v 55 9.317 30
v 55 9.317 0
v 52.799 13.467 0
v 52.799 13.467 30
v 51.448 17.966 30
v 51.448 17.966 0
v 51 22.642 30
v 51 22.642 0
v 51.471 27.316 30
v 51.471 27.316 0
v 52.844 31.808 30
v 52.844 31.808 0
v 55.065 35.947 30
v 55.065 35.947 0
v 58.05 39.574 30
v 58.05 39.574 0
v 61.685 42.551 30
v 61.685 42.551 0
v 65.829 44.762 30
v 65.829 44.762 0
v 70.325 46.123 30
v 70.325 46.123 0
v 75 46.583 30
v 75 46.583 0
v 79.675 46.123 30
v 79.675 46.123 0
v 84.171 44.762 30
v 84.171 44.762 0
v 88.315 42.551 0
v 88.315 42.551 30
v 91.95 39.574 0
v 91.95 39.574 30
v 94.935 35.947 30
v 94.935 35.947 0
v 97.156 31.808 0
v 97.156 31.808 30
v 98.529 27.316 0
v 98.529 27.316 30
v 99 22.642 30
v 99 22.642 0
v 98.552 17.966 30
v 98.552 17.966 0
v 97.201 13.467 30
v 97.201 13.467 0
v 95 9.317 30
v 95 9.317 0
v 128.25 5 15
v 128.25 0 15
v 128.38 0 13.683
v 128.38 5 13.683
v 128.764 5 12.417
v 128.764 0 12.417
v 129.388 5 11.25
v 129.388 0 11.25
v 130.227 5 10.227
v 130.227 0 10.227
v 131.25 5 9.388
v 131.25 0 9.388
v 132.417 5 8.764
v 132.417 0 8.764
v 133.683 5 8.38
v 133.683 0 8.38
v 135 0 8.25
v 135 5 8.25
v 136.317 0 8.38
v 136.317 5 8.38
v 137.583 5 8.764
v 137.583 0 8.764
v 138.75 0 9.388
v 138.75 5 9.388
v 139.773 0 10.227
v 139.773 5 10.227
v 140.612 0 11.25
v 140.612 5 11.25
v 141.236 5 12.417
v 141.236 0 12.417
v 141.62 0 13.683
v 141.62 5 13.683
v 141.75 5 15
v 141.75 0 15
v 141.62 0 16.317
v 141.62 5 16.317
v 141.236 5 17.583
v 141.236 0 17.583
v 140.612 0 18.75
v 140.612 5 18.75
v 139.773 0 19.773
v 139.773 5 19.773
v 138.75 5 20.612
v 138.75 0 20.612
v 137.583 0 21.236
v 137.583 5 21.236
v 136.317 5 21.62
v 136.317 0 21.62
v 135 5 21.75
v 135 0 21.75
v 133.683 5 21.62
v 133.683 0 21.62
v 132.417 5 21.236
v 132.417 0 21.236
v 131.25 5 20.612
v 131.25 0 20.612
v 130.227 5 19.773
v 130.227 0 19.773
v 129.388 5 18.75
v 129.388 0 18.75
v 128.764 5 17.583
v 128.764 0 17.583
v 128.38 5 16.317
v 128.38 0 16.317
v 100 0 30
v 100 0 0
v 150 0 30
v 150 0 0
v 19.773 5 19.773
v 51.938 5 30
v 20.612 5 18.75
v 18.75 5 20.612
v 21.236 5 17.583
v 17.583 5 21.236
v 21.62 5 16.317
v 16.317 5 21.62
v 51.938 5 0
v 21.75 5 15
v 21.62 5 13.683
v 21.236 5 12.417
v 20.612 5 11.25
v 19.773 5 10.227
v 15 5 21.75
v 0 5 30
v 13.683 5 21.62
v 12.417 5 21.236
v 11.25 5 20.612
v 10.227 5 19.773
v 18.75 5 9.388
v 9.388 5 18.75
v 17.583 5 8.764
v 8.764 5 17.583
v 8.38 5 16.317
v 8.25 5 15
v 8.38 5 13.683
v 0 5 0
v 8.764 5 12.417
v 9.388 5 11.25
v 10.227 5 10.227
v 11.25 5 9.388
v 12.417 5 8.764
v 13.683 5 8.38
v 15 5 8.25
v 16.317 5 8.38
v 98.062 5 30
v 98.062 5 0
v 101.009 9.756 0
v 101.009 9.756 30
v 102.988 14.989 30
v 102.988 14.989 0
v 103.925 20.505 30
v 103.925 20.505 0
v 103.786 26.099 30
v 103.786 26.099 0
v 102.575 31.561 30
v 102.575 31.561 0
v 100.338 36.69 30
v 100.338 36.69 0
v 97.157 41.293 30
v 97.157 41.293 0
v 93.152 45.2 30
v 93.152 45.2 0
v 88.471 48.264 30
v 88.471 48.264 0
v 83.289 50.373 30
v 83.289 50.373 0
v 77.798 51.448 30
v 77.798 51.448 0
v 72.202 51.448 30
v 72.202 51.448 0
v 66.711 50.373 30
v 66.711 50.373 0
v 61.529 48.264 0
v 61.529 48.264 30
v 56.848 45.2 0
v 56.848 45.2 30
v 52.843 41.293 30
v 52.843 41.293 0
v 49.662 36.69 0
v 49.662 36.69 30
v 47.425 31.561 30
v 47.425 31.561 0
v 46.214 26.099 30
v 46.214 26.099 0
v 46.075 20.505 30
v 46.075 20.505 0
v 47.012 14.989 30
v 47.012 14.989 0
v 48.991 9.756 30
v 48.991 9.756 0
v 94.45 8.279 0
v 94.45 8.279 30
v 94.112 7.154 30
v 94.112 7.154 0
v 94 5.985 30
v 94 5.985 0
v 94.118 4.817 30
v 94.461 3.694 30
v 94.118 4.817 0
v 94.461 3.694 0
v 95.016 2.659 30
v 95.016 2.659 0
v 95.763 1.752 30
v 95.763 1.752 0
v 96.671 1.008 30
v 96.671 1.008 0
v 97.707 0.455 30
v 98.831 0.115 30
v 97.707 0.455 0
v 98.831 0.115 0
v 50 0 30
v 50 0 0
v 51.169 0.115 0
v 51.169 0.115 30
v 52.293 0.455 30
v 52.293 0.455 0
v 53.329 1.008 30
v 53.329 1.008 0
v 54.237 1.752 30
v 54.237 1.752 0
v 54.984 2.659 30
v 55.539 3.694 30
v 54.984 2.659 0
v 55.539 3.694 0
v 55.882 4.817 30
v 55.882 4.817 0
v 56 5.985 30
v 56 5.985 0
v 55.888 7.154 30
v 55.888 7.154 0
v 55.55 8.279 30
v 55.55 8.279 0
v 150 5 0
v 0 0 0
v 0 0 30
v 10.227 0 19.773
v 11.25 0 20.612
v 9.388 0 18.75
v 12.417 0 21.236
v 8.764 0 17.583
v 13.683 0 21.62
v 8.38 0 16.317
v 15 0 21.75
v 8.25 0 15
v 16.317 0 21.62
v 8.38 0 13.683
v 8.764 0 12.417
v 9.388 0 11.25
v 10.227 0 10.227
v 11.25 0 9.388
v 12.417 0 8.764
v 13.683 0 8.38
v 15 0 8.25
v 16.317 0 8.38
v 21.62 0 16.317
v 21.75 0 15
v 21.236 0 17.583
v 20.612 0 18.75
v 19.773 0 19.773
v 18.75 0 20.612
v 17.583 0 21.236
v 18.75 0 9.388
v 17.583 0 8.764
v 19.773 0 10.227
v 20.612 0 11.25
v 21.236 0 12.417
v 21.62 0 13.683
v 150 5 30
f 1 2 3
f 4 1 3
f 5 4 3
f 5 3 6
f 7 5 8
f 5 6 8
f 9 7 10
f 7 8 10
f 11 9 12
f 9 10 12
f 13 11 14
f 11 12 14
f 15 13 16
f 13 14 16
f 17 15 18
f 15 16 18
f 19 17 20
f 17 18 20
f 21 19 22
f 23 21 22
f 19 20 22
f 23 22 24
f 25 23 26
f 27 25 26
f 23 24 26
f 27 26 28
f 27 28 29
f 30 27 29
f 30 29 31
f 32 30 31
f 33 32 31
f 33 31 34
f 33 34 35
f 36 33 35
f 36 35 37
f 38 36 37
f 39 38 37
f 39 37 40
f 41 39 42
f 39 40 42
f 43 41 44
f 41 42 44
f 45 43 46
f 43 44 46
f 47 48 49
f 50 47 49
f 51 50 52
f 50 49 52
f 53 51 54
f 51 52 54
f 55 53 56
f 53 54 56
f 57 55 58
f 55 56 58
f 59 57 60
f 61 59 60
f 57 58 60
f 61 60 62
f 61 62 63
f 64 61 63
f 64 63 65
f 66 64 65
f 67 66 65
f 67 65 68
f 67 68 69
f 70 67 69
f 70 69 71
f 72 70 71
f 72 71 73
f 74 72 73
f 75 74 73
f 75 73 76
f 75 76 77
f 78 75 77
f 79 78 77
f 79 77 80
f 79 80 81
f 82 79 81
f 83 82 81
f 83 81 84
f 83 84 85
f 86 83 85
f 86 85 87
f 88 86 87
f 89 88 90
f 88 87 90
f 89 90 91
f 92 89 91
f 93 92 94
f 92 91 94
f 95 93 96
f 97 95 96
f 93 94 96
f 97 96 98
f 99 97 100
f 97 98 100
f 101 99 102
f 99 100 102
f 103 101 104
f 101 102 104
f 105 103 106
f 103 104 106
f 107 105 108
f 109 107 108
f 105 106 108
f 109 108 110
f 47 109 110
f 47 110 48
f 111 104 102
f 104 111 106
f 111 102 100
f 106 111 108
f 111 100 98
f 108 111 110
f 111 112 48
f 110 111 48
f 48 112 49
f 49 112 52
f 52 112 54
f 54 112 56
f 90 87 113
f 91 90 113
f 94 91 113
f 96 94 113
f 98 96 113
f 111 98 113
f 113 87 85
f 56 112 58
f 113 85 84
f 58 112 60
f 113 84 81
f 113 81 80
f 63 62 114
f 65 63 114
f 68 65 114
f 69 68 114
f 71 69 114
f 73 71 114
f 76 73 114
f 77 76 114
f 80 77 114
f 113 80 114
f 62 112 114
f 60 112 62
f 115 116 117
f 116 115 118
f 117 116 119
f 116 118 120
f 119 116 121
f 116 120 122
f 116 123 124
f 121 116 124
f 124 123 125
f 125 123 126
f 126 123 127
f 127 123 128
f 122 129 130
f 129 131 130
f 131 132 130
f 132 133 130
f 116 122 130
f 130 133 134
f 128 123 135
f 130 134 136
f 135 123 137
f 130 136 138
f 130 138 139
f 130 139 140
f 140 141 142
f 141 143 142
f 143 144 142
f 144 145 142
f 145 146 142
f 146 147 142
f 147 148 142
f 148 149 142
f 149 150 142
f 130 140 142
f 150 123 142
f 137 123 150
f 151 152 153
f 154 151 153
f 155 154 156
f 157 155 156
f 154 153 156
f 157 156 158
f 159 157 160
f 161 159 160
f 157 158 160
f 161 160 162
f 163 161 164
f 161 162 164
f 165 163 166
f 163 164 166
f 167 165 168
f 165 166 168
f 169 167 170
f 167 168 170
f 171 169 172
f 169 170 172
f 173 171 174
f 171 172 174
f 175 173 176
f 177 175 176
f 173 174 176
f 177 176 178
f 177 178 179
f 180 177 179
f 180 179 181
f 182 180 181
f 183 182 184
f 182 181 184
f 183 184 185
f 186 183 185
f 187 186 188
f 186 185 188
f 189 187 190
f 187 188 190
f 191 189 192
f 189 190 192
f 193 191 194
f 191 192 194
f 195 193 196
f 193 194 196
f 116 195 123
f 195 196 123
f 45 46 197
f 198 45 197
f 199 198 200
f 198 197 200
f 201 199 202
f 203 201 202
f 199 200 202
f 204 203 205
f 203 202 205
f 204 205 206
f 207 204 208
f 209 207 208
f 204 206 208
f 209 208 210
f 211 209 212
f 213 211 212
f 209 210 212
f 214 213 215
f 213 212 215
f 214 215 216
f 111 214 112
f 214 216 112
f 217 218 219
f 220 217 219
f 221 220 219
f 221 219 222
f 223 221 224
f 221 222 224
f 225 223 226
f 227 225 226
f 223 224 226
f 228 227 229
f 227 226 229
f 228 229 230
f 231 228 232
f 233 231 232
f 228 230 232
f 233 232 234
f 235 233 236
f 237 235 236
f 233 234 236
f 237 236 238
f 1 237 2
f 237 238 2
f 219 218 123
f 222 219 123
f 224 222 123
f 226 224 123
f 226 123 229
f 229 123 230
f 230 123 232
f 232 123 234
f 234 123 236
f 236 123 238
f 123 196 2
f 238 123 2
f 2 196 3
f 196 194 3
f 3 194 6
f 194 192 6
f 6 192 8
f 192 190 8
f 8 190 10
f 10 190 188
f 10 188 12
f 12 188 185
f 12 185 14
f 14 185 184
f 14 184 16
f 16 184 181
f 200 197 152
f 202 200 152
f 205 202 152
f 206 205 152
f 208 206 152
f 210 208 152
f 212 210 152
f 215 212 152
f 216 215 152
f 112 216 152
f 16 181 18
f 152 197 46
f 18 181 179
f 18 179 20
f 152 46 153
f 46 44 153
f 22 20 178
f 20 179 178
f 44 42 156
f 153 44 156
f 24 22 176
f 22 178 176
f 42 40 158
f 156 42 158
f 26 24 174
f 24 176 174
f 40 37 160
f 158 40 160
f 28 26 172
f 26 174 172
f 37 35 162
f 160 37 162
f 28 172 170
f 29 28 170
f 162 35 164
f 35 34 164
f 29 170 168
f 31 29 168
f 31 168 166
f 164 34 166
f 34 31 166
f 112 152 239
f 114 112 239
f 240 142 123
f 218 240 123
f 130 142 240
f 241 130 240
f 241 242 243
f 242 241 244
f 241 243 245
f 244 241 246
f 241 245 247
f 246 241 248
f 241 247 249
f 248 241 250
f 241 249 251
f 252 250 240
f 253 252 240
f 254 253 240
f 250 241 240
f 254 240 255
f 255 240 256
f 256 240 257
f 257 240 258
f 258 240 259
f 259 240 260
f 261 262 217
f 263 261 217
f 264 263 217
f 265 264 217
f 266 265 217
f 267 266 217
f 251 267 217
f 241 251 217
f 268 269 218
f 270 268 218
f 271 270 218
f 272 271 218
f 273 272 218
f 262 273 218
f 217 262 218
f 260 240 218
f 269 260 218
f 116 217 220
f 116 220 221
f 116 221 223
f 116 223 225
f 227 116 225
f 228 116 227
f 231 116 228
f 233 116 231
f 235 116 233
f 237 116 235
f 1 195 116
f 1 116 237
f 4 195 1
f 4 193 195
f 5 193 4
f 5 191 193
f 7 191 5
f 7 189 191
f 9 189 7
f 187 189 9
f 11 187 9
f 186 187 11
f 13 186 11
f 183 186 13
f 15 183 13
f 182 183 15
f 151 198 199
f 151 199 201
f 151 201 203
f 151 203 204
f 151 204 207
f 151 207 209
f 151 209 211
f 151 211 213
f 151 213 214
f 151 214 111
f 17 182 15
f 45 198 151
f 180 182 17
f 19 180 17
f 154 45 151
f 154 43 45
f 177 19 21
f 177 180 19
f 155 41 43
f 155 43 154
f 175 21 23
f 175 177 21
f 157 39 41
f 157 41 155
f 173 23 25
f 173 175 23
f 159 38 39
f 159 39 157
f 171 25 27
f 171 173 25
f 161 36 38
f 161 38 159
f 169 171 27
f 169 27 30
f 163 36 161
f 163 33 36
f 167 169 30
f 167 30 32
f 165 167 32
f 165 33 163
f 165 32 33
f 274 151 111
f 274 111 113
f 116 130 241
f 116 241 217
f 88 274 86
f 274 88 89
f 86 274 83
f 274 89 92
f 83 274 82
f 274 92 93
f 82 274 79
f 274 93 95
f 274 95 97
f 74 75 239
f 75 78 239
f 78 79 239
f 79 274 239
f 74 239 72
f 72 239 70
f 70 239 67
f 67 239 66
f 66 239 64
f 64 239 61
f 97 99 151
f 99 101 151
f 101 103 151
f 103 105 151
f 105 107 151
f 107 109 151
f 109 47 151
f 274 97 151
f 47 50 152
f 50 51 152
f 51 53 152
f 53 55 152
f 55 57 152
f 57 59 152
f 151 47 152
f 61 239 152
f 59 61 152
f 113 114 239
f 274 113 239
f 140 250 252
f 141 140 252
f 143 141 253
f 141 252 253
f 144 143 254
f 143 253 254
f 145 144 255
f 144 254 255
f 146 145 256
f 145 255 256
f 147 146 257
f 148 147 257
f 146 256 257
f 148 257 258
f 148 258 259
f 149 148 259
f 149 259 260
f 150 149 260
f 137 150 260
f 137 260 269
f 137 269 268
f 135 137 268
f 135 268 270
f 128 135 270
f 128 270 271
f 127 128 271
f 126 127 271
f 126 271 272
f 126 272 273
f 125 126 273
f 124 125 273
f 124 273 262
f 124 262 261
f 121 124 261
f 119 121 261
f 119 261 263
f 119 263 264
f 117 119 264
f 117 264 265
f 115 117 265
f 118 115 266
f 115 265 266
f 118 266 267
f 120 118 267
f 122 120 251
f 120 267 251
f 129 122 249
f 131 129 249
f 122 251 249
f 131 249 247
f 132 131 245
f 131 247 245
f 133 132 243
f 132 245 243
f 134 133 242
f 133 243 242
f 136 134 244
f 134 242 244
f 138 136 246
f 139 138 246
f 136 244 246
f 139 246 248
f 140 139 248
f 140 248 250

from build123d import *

# Parameters (mm, degrees)
BOSS_EXTRUDE1_DEPTH   = 30
M12_CLEARANCE_HOLE2_D = 13.5


with BuildPart() as part:
    # Sketch1 → Boss-Extrude1 (new body)
    with BuildSketch(Plane.XY):
        with BuildLine():
            Line((0, 0), (50, 0))
            ThreePointArc((50, 0), (55.286764074, 3.162725669), (55, 9.31662479))
            ThreePointArc((55, 9.31662479), (75, 46.583123952), (95, 9.31662479))
            ThreePointArc((95, 9.31662479), (94.713235926, 3.162725669), (100, 0))
            Line((100, 0), (150, 0))
            Line((150, 0), (150, 5))
            Line((150, 5), (98.061521027, 5))
            ThreePointArc((98.061521027, 5), (75, 51.583123952), (51.938478973, 5))
            Line((51.938478973, 5), (5, 5))
            Line((5, 5), (0, 5))
            Line((0, 5), (0, 0))
        make_face()
    extrude(amount=BOSS_EXTRUDE1_DEPTH)

    # M12 Clearance Hole2 (through all)
    with Locations(Plane(origin=(0, 5, 0), x_dir=(1, 0, 0), z_dir=(0, 1, 0))):
        with Locations((15, -15), (135, -15)):
            Hole(M12_CLEARANCE_HOLE2_D / 2)


solid = part.part
